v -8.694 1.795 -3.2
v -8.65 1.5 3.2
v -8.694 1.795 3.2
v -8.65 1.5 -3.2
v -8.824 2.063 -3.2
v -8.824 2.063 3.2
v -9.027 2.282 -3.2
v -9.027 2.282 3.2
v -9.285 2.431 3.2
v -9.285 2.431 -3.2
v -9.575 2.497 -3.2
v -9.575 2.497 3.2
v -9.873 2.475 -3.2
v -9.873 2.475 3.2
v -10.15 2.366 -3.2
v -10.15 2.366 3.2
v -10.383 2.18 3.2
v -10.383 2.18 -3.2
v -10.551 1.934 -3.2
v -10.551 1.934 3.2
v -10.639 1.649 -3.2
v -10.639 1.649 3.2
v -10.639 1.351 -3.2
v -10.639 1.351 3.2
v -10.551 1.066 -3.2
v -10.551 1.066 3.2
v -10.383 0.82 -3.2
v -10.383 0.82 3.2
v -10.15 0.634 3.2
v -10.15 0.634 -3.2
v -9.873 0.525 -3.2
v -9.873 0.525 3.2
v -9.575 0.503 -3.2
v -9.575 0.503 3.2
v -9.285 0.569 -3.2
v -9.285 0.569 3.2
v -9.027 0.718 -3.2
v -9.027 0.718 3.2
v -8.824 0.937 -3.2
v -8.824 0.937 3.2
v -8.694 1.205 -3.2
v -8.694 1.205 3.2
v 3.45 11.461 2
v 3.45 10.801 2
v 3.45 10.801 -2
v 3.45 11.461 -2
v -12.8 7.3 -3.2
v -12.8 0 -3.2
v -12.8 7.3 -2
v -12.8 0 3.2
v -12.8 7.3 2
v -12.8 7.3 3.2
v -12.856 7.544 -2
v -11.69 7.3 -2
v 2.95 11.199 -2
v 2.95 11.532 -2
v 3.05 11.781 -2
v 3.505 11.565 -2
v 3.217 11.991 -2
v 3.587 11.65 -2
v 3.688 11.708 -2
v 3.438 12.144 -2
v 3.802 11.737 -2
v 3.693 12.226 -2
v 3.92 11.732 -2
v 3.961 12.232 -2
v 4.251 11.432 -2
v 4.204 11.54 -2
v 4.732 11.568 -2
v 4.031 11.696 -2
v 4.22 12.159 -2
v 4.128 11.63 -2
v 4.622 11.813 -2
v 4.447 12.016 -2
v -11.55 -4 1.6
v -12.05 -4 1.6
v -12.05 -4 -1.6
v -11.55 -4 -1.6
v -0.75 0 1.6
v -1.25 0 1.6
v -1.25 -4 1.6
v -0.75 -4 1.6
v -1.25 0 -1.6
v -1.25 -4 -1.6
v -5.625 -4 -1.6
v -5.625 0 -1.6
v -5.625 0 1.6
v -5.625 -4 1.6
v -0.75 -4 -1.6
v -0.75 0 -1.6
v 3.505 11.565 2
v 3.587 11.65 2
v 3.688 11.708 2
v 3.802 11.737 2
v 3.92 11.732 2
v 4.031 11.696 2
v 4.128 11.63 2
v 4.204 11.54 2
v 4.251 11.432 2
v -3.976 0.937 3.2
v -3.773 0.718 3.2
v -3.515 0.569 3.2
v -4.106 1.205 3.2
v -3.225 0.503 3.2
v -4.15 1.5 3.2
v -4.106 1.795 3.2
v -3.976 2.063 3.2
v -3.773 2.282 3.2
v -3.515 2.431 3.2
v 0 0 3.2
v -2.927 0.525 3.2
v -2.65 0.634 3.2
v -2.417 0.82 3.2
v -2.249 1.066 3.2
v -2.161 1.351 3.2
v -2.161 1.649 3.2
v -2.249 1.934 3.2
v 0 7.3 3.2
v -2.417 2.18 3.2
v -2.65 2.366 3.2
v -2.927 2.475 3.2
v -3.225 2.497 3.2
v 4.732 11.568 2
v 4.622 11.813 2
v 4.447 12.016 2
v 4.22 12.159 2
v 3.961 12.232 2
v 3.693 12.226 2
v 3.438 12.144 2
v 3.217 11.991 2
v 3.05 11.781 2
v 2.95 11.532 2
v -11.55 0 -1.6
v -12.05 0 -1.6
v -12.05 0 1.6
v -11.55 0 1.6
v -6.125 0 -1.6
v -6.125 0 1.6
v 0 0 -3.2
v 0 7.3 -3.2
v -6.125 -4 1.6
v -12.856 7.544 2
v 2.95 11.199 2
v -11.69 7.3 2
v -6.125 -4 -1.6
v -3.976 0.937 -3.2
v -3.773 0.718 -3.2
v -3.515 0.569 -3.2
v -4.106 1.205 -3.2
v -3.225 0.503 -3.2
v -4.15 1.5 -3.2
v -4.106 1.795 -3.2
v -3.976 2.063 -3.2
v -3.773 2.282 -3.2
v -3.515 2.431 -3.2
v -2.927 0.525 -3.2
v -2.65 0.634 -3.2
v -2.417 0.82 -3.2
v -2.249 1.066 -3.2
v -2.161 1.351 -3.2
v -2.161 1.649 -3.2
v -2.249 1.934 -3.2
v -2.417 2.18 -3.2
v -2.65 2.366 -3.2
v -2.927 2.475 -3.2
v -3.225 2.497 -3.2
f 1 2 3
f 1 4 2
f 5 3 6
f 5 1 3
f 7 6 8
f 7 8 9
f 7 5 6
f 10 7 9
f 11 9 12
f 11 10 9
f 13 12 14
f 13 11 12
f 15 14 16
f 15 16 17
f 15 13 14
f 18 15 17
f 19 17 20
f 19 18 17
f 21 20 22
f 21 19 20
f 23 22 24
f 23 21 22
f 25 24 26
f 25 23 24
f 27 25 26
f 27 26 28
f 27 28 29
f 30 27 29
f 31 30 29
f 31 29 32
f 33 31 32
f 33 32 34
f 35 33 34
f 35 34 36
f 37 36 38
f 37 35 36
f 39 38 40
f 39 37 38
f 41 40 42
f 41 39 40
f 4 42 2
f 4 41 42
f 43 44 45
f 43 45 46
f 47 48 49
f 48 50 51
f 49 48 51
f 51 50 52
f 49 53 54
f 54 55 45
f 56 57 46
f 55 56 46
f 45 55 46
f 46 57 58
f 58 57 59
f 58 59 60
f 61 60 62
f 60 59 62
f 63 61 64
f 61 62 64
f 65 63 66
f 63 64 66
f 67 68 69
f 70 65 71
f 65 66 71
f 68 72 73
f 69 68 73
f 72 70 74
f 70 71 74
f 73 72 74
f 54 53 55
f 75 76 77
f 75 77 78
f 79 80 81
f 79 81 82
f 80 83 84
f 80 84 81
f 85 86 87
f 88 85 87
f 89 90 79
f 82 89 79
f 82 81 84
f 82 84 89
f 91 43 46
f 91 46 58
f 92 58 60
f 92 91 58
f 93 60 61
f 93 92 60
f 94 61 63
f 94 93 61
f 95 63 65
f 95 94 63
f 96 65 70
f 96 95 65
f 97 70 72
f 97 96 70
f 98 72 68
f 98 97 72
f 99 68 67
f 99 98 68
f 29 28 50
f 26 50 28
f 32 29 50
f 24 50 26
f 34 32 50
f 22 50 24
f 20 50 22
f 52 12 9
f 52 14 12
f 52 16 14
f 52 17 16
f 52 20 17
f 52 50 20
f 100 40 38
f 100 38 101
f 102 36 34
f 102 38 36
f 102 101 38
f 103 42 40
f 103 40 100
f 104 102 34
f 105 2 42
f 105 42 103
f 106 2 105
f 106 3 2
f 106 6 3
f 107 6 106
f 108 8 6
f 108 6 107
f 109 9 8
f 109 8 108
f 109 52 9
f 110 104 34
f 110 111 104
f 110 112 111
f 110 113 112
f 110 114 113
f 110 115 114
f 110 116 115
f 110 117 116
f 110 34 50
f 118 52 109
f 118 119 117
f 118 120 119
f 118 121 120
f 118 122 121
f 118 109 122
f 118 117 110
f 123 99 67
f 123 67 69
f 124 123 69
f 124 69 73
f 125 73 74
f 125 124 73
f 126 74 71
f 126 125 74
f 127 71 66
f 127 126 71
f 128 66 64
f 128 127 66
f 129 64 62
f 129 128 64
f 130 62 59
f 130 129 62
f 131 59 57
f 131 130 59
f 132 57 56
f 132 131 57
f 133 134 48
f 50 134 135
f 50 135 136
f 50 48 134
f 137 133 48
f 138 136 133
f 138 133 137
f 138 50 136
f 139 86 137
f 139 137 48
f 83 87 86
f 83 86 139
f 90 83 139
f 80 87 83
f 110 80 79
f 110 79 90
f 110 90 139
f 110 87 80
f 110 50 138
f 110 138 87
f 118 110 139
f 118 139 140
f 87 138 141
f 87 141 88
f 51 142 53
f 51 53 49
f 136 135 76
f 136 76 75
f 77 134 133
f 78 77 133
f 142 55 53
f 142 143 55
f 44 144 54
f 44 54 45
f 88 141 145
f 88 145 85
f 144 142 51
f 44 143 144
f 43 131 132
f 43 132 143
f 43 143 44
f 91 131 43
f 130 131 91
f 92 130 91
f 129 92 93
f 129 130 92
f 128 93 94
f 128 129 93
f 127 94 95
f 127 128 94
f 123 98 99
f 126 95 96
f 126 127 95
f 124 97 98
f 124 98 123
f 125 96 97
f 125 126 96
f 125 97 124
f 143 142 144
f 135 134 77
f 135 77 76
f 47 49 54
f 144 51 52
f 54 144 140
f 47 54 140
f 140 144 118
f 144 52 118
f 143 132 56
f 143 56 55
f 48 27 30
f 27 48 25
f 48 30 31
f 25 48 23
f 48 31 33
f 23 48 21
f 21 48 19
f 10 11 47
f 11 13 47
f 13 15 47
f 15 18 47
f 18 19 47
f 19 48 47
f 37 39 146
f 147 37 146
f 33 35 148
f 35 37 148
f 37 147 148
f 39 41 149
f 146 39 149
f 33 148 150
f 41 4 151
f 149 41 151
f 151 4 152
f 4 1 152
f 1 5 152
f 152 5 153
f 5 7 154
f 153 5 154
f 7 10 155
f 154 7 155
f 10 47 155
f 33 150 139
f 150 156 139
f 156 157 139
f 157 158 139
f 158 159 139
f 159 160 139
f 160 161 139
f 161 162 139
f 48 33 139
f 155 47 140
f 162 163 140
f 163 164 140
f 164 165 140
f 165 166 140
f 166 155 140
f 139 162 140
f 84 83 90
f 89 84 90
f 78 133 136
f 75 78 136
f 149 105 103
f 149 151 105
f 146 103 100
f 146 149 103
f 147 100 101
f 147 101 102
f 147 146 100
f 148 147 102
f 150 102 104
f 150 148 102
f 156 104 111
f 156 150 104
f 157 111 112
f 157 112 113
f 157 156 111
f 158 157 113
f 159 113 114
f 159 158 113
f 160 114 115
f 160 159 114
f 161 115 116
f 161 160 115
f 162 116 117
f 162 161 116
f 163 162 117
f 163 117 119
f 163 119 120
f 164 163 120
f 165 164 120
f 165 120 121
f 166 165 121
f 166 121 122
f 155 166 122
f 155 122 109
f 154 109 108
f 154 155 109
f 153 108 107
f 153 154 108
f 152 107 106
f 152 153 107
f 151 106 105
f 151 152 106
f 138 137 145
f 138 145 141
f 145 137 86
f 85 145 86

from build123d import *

# Parameters (mm, degrees)
SKETCH_1_W        = 12.8
SKETCH_1_H        = 7.3
SKETCH_1_R        = 1
EXTRUDE_1_DEPTH   = 3.2
SKETCH_2_W        = 0.5
SKETCH_2_H        = 3.2
EXTRUDE_1_2_DEPTH = 4
EXTRUDE_2_DEPTH   = 2


with BuildPart() as part:
    # Эскиз1 → Extrude 1 (new, symmetric)
    with BuildSketch(Plane.XY):
        with Locations((-6.4, 3.65)):
            Rectangle(SKETCH_1_W, SKETCH_1_H)
        with Locations((-9.65, 1.5)):
            Circle(SKETCH_1_R, mode=Mode.SUBTRACT)
        with Locations(Location((-3.15, 1.5, 0), (0, 0, 180))):
            Circle(SKETCH_1_R, mode=Mode.SUBTRACT)
    extrude(amount=EXTRUDE_1_DEPTH, both=True)

    # Эскиз2 → Extrude 1 2 (add)
    with BuildSketch(Plane.XZ):
        with Locations((-11.8, 0)):
            Rectangle(SKETCH_2_W, SKETCH_2_H)
        with Locations((-5.874787357, 0)):
            Rectangle(SKETCH_2_W, SKETCH_2_H)
        with Locations((-1, 0)):
            Rectangle(SKETCH_2_W, SKETCH_2_H)
    extrude(amount=EXTRUDE_1_2_DEPTH)

    # Эскиз3 → Вытянуть-Тонкостенный2 (add, symmetric)
    with BuildSketch(Plane.XY):
        with BuildLine():
            Line((-12.743673948, 7.056427884), (3.45, 10.801214984))
            Line((3.45, 10.801214984), (3.45, 11.461328502))
            ThreePointArc((3.45, 11.461328502), (3.861060305, 11.738598826), (4.25086812, 11.432168941))
            Line((4.25086812, 11.432168941), (4.732112122, 11.567831059))
            ThreePointArc((4.732112122, 11.567831059), (3.827123632, 12.23868926), (2.95, 11.531788258))
            Line((2.95, 11.531788258), (2.95, 11.198785016))
            Line((2.95, 11.198785016), (-12.856326052, 7.543572116))
            Line((-12.856326052, 7.543572116), (-12.743673948, 7.056427884))
        make_face()
    extrude(amount=EXTRUDE_2_DEPTH, both=True)


solid = part.part
